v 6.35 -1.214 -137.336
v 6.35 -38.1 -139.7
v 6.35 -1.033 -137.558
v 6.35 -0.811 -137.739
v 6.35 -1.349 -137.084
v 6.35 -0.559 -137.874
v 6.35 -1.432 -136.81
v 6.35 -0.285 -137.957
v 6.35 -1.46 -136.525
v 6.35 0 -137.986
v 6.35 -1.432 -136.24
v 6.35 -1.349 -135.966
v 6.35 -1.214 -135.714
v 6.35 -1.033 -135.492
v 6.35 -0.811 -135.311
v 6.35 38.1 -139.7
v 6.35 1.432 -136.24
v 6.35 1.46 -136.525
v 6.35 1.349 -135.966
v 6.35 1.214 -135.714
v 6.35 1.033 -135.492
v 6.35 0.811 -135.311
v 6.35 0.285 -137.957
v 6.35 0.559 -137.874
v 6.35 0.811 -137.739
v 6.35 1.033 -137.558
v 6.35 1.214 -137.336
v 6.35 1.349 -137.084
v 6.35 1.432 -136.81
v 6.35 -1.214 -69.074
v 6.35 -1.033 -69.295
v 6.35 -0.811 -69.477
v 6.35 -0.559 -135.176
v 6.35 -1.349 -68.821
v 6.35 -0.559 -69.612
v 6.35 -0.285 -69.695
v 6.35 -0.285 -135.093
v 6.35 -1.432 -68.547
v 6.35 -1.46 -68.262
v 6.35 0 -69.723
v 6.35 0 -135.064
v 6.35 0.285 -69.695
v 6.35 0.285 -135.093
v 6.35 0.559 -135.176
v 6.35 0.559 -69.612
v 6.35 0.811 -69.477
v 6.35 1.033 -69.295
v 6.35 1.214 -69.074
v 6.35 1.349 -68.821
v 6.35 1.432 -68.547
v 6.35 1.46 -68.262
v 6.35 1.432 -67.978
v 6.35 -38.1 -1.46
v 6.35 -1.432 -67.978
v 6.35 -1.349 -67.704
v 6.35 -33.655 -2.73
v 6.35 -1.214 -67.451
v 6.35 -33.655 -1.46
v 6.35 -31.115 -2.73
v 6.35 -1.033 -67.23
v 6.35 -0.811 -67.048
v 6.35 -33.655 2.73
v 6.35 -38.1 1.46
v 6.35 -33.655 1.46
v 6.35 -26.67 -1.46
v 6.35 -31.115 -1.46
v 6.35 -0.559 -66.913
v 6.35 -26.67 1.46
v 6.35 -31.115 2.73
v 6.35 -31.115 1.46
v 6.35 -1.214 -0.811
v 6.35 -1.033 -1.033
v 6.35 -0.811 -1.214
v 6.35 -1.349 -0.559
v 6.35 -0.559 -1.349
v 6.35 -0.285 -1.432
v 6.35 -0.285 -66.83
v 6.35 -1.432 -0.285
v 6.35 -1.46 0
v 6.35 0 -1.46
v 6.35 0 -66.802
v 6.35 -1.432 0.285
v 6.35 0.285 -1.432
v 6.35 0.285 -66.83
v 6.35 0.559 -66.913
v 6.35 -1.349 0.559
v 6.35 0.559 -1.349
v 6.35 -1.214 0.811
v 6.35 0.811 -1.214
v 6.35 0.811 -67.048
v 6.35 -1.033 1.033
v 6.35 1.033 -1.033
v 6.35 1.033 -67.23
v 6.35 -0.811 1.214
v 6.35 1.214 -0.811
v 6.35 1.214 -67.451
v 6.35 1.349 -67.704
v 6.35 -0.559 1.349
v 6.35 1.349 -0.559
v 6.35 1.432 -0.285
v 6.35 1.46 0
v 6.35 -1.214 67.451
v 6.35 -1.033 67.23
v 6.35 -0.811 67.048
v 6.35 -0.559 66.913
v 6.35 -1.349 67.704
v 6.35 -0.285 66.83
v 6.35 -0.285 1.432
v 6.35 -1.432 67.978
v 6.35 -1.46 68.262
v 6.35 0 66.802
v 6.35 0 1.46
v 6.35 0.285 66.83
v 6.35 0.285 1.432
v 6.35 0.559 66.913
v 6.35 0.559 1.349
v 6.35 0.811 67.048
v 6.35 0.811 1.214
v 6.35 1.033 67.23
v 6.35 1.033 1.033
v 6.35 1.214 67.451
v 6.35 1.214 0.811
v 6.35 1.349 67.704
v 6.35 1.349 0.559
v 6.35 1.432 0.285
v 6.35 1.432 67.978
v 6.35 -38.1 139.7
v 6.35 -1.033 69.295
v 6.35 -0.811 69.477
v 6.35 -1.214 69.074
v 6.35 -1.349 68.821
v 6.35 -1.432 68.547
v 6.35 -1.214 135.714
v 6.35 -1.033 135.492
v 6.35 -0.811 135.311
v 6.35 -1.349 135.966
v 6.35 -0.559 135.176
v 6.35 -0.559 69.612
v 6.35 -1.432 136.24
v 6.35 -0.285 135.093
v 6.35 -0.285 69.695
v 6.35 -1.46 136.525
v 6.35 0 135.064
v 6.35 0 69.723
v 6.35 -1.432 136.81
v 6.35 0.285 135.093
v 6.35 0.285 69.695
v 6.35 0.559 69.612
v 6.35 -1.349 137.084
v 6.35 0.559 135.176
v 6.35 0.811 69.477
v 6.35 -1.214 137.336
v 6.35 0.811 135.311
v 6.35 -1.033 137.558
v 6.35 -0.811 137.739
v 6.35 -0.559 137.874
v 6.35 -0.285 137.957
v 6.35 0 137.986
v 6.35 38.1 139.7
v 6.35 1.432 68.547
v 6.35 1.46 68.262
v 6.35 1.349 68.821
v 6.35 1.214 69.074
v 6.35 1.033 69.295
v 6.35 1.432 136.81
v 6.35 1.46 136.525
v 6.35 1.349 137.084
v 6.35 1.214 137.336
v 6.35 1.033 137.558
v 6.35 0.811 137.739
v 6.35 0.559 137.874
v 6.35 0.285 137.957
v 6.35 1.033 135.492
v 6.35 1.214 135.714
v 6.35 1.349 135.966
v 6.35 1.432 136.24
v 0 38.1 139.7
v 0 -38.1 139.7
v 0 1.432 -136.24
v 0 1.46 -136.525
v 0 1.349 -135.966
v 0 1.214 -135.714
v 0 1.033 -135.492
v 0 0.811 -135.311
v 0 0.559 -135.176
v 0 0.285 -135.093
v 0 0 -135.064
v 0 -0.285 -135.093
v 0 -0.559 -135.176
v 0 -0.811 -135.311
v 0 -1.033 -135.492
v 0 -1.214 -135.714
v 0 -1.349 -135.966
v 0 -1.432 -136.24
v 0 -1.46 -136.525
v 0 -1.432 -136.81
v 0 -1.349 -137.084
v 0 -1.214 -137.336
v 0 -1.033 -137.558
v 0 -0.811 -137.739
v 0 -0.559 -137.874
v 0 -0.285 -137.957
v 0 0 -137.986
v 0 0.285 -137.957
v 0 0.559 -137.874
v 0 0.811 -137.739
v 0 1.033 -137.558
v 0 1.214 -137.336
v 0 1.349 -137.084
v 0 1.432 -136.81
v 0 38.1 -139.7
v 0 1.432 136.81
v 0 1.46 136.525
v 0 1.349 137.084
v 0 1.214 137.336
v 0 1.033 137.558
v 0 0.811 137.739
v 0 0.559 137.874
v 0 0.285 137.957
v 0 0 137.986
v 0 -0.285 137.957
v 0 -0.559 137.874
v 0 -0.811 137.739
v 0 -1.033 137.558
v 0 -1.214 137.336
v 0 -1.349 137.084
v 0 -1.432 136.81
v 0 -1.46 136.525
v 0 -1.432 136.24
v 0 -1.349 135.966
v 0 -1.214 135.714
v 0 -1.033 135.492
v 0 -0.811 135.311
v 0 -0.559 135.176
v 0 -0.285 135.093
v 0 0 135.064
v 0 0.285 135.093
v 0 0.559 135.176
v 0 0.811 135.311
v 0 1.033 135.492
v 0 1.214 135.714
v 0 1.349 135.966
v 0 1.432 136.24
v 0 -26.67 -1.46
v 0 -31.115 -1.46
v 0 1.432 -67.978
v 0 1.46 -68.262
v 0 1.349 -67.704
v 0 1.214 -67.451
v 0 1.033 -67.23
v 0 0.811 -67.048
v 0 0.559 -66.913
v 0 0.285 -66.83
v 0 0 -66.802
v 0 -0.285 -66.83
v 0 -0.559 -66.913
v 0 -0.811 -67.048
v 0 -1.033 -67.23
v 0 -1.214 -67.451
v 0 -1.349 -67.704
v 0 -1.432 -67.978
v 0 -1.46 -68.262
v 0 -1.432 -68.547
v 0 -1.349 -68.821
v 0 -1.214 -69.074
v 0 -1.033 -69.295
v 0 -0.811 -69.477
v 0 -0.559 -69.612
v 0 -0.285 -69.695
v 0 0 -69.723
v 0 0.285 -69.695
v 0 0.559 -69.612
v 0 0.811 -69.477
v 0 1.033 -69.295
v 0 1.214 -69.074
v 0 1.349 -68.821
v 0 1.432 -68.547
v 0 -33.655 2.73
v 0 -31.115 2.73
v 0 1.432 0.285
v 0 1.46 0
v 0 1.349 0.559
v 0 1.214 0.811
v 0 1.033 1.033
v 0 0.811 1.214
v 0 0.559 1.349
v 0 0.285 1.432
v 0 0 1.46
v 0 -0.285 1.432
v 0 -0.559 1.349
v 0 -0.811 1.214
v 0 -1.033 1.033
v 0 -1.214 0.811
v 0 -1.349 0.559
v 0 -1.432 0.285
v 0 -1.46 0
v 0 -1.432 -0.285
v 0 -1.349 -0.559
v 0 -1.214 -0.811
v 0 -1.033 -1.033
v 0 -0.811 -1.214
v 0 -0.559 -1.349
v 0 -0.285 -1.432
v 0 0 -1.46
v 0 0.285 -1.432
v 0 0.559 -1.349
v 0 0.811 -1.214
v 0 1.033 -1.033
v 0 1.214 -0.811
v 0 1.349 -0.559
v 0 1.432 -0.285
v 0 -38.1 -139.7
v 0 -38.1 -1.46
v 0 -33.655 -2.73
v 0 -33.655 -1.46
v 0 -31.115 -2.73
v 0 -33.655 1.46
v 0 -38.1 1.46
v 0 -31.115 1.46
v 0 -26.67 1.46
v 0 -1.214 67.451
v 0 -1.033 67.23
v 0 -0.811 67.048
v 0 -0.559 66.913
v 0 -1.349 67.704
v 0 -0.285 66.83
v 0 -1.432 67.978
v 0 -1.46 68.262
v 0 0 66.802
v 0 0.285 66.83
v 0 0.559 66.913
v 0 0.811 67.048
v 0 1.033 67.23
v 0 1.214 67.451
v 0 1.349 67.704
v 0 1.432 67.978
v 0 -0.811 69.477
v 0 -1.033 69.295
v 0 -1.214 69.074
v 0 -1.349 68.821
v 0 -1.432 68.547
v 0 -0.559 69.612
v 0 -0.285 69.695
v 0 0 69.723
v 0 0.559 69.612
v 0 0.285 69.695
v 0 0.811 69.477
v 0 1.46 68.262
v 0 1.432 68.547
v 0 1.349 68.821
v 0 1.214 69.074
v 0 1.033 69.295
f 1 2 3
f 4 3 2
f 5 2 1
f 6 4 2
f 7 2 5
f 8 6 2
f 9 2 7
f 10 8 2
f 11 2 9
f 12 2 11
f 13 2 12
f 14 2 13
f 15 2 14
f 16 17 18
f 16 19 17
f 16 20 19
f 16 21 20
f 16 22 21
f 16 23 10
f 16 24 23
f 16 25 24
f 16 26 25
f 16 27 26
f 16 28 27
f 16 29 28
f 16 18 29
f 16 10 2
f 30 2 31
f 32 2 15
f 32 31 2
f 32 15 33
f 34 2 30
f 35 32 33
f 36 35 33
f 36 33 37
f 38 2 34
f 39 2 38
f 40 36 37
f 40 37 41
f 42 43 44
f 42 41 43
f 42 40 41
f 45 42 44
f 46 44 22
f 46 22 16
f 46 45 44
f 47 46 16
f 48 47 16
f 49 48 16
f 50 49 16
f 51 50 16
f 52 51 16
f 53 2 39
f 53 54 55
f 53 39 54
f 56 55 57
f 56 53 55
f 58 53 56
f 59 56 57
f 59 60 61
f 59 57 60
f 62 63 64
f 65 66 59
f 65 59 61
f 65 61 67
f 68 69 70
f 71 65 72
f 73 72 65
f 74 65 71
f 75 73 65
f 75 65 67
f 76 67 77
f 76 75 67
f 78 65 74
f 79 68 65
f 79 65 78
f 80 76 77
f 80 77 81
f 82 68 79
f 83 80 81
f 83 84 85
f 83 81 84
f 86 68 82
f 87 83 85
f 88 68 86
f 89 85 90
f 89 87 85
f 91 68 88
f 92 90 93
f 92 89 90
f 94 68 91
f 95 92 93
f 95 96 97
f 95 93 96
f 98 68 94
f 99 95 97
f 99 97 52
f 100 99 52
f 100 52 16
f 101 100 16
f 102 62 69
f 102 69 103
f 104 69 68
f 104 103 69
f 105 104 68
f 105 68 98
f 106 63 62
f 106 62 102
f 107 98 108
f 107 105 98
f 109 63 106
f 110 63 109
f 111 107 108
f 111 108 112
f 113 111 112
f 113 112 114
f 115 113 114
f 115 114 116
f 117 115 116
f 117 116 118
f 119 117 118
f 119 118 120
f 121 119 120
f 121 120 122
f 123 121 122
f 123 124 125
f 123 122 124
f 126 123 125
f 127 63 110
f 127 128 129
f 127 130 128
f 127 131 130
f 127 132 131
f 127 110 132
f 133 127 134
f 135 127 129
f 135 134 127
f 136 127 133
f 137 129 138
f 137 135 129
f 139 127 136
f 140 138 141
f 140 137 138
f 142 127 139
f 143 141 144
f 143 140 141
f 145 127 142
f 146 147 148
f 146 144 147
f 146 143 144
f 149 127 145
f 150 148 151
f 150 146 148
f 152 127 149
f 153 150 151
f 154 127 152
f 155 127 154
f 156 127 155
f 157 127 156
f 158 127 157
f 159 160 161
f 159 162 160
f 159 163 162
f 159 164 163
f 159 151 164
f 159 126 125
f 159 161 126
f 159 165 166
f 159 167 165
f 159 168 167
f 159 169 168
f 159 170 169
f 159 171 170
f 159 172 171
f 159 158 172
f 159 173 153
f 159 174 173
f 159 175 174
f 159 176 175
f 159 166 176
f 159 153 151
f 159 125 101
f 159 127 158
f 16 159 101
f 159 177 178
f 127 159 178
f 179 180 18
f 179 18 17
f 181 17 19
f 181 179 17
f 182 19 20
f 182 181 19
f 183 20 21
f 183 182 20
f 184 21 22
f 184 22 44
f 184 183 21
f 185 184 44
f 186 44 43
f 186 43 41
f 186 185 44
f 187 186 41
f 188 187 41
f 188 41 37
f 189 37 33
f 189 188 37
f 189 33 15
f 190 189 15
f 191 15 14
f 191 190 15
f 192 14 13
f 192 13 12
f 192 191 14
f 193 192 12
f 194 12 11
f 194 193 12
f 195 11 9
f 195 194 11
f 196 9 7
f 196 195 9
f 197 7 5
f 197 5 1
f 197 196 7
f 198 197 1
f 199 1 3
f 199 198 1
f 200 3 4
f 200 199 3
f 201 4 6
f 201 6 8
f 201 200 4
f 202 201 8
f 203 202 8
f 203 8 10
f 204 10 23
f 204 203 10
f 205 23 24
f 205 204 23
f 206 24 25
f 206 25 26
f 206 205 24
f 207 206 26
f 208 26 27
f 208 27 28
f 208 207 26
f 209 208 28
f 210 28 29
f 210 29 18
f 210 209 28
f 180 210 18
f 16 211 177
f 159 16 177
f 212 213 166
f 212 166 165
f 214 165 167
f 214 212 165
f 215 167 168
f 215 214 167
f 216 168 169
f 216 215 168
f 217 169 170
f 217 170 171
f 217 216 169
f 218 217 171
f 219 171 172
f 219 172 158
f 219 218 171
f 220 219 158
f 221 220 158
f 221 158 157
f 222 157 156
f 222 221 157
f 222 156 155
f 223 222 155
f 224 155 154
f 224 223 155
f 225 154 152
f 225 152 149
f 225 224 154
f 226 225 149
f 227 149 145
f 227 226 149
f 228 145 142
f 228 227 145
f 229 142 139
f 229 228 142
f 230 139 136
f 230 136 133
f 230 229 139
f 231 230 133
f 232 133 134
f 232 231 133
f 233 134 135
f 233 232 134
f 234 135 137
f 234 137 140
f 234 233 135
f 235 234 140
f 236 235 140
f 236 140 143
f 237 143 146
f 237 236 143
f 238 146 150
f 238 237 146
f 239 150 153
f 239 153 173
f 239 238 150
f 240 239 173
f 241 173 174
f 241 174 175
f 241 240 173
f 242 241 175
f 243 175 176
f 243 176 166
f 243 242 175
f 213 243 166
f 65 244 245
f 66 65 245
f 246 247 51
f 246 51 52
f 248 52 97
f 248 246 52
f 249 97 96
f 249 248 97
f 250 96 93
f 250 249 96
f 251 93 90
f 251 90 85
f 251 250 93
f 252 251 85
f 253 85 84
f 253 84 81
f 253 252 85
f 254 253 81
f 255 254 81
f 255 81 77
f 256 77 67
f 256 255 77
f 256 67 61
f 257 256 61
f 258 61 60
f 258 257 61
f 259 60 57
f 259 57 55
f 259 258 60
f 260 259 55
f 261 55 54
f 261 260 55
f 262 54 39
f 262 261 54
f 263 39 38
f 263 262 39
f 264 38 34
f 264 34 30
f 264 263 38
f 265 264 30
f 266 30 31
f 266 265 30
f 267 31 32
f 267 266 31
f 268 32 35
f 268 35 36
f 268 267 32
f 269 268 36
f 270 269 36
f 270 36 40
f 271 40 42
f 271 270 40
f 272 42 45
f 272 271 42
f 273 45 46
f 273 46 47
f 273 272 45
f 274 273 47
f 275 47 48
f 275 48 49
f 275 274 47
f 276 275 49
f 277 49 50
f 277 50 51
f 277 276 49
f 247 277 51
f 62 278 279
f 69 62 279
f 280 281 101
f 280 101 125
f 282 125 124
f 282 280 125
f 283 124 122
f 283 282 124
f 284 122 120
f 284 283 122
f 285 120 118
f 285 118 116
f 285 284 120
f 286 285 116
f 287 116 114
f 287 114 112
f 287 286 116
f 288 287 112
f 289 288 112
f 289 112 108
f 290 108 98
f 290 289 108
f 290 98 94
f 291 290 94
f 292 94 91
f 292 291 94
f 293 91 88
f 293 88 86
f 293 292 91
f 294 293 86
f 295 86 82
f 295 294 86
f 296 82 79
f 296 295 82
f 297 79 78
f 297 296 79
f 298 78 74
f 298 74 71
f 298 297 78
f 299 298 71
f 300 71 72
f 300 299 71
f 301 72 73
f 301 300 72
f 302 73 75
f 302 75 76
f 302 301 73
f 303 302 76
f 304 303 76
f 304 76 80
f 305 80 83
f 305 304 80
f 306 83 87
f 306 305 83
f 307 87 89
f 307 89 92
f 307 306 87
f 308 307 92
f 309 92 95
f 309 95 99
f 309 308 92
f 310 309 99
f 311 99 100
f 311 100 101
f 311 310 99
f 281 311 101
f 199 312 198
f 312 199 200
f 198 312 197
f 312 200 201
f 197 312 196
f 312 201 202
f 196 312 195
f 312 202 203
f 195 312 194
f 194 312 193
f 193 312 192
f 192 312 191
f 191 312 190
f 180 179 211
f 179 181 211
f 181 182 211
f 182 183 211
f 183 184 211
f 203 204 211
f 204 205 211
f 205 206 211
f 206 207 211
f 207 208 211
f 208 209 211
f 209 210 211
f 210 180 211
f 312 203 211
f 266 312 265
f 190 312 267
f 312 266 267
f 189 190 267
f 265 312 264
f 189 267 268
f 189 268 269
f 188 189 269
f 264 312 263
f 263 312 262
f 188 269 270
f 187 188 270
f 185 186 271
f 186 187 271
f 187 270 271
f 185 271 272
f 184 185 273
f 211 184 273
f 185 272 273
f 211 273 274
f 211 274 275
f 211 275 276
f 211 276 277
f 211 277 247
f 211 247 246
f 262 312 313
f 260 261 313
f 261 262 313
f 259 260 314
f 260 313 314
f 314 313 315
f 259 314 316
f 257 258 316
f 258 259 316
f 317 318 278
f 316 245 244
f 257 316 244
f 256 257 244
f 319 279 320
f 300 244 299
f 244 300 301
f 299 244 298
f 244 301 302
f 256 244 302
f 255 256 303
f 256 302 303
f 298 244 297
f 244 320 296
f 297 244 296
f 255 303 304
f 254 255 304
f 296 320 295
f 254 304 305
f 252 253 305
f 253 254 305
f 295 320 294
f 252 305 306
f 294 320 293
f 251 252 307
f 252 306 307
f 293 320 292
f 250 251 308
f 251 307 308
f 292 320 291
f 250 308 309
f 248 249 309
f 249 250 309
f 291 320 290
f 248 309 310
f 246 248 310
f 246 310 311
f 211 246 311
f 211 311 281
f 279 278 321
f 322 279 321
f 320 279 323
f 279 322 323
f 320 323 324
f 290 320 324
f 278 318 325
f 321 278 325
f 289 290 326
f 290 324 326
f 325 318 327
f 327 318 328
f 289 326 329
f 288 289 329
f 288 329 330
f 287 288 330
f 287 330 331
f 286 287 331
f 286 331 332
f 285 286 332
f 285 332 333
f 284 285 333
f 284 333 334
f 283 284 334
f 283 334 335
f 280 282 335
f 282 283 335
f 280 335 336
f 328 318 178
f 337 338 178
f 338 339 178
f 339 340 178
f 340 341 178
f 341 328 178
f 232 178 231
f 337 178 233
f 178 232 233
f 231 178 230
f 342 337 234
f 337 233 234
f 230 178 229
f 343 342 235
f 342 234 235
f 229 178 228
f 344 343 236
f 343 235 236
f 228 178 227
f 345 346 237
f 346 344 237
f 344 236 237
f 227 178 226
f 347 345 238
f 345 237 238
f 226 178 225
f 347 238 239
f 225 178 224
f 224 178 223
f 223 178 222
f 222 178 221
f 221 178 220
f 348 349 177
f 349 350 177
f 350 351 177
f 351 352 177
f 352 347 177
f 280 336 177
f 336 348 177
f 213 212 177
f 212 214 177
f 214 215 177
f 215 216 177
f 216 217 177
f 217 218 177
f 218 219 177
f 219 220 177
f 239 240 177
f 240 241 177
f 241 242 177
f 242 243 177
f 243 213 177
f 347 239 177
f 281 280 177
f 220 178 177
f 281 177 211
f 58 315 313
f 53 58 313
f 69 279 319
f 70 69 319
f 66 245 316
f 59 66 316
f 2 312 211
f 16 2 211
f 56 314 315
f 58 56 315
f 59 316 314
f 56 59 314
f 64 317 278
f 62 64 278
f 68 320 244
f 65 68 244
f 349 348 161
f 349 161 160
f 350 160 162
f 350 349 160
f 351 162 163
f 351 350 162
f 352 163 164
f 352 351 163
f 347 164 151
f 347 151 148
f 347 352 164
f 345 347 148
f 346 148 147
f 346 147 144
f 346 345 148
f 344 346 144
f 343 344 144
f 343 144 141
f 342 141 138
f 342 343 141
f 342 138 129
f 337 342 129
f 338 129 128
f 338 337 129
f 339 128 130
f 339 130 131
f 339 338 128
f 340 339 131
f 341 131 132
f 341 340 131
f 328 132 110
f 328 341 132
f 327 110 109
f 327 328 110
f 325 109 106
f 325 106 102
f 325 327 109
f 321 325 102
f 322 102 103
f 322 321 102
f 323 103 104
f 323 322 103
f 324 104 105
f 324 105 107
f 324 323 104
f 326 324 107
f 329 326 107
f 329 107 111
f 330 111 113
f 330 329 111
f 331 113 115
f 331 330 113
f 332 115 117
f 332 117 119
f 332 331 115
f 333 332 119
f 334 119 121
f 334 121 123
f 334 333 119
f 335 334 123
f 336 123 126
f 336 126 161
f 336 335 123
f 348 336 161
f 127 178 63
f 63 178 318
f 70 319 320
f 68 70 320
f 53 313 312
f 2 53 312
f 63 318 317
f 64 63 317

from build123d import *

# Parameters (mm, degrees)
F0_R     = 1.4605
F1_DEPTH = 6.35


with BuildPart() as f1:
    # F0 (on Right) → F1 (new body)
    with BuildSketch(Plane.YZ):
        Polygon((38.1, 139.7), (-38.1, 139.7), (-38.1, 1.4605), (-33.655, 1.4605), (-33.655, 2.7305), (-31.115, 2.7305), (-31.115, 1.4605), (-26.67, 1.4605), (-26.67, -1.4605), (-31.115, -1.4605), (-31.115, -2.7305), (-33.655, -2.7305), (-33.655, -1.4605), (-38.1, -1.4605), (-38.1, -139.7), (38.1, -139.7), align=None)
        with Locations((0, -136.525)):
            Circle(F0_R, mode=Mode.SUBTRACT)
        with Locations((0, -68.2625)):
            Circle(F0_R, mode=Mode.SUBTRACT)
        Circle(F0_R, mode=Mode.SUBTRACT)
        with Locations((0, 68.2625)):
            Circle(F0_R, mode=Mode.SUBTRACT)
        with Locations((0, 136.525)):
            Circle(F0_R, mode=Mode.SUBTRACT)
    extrude(amount=F1_DEPTH)


solid = f1.part
